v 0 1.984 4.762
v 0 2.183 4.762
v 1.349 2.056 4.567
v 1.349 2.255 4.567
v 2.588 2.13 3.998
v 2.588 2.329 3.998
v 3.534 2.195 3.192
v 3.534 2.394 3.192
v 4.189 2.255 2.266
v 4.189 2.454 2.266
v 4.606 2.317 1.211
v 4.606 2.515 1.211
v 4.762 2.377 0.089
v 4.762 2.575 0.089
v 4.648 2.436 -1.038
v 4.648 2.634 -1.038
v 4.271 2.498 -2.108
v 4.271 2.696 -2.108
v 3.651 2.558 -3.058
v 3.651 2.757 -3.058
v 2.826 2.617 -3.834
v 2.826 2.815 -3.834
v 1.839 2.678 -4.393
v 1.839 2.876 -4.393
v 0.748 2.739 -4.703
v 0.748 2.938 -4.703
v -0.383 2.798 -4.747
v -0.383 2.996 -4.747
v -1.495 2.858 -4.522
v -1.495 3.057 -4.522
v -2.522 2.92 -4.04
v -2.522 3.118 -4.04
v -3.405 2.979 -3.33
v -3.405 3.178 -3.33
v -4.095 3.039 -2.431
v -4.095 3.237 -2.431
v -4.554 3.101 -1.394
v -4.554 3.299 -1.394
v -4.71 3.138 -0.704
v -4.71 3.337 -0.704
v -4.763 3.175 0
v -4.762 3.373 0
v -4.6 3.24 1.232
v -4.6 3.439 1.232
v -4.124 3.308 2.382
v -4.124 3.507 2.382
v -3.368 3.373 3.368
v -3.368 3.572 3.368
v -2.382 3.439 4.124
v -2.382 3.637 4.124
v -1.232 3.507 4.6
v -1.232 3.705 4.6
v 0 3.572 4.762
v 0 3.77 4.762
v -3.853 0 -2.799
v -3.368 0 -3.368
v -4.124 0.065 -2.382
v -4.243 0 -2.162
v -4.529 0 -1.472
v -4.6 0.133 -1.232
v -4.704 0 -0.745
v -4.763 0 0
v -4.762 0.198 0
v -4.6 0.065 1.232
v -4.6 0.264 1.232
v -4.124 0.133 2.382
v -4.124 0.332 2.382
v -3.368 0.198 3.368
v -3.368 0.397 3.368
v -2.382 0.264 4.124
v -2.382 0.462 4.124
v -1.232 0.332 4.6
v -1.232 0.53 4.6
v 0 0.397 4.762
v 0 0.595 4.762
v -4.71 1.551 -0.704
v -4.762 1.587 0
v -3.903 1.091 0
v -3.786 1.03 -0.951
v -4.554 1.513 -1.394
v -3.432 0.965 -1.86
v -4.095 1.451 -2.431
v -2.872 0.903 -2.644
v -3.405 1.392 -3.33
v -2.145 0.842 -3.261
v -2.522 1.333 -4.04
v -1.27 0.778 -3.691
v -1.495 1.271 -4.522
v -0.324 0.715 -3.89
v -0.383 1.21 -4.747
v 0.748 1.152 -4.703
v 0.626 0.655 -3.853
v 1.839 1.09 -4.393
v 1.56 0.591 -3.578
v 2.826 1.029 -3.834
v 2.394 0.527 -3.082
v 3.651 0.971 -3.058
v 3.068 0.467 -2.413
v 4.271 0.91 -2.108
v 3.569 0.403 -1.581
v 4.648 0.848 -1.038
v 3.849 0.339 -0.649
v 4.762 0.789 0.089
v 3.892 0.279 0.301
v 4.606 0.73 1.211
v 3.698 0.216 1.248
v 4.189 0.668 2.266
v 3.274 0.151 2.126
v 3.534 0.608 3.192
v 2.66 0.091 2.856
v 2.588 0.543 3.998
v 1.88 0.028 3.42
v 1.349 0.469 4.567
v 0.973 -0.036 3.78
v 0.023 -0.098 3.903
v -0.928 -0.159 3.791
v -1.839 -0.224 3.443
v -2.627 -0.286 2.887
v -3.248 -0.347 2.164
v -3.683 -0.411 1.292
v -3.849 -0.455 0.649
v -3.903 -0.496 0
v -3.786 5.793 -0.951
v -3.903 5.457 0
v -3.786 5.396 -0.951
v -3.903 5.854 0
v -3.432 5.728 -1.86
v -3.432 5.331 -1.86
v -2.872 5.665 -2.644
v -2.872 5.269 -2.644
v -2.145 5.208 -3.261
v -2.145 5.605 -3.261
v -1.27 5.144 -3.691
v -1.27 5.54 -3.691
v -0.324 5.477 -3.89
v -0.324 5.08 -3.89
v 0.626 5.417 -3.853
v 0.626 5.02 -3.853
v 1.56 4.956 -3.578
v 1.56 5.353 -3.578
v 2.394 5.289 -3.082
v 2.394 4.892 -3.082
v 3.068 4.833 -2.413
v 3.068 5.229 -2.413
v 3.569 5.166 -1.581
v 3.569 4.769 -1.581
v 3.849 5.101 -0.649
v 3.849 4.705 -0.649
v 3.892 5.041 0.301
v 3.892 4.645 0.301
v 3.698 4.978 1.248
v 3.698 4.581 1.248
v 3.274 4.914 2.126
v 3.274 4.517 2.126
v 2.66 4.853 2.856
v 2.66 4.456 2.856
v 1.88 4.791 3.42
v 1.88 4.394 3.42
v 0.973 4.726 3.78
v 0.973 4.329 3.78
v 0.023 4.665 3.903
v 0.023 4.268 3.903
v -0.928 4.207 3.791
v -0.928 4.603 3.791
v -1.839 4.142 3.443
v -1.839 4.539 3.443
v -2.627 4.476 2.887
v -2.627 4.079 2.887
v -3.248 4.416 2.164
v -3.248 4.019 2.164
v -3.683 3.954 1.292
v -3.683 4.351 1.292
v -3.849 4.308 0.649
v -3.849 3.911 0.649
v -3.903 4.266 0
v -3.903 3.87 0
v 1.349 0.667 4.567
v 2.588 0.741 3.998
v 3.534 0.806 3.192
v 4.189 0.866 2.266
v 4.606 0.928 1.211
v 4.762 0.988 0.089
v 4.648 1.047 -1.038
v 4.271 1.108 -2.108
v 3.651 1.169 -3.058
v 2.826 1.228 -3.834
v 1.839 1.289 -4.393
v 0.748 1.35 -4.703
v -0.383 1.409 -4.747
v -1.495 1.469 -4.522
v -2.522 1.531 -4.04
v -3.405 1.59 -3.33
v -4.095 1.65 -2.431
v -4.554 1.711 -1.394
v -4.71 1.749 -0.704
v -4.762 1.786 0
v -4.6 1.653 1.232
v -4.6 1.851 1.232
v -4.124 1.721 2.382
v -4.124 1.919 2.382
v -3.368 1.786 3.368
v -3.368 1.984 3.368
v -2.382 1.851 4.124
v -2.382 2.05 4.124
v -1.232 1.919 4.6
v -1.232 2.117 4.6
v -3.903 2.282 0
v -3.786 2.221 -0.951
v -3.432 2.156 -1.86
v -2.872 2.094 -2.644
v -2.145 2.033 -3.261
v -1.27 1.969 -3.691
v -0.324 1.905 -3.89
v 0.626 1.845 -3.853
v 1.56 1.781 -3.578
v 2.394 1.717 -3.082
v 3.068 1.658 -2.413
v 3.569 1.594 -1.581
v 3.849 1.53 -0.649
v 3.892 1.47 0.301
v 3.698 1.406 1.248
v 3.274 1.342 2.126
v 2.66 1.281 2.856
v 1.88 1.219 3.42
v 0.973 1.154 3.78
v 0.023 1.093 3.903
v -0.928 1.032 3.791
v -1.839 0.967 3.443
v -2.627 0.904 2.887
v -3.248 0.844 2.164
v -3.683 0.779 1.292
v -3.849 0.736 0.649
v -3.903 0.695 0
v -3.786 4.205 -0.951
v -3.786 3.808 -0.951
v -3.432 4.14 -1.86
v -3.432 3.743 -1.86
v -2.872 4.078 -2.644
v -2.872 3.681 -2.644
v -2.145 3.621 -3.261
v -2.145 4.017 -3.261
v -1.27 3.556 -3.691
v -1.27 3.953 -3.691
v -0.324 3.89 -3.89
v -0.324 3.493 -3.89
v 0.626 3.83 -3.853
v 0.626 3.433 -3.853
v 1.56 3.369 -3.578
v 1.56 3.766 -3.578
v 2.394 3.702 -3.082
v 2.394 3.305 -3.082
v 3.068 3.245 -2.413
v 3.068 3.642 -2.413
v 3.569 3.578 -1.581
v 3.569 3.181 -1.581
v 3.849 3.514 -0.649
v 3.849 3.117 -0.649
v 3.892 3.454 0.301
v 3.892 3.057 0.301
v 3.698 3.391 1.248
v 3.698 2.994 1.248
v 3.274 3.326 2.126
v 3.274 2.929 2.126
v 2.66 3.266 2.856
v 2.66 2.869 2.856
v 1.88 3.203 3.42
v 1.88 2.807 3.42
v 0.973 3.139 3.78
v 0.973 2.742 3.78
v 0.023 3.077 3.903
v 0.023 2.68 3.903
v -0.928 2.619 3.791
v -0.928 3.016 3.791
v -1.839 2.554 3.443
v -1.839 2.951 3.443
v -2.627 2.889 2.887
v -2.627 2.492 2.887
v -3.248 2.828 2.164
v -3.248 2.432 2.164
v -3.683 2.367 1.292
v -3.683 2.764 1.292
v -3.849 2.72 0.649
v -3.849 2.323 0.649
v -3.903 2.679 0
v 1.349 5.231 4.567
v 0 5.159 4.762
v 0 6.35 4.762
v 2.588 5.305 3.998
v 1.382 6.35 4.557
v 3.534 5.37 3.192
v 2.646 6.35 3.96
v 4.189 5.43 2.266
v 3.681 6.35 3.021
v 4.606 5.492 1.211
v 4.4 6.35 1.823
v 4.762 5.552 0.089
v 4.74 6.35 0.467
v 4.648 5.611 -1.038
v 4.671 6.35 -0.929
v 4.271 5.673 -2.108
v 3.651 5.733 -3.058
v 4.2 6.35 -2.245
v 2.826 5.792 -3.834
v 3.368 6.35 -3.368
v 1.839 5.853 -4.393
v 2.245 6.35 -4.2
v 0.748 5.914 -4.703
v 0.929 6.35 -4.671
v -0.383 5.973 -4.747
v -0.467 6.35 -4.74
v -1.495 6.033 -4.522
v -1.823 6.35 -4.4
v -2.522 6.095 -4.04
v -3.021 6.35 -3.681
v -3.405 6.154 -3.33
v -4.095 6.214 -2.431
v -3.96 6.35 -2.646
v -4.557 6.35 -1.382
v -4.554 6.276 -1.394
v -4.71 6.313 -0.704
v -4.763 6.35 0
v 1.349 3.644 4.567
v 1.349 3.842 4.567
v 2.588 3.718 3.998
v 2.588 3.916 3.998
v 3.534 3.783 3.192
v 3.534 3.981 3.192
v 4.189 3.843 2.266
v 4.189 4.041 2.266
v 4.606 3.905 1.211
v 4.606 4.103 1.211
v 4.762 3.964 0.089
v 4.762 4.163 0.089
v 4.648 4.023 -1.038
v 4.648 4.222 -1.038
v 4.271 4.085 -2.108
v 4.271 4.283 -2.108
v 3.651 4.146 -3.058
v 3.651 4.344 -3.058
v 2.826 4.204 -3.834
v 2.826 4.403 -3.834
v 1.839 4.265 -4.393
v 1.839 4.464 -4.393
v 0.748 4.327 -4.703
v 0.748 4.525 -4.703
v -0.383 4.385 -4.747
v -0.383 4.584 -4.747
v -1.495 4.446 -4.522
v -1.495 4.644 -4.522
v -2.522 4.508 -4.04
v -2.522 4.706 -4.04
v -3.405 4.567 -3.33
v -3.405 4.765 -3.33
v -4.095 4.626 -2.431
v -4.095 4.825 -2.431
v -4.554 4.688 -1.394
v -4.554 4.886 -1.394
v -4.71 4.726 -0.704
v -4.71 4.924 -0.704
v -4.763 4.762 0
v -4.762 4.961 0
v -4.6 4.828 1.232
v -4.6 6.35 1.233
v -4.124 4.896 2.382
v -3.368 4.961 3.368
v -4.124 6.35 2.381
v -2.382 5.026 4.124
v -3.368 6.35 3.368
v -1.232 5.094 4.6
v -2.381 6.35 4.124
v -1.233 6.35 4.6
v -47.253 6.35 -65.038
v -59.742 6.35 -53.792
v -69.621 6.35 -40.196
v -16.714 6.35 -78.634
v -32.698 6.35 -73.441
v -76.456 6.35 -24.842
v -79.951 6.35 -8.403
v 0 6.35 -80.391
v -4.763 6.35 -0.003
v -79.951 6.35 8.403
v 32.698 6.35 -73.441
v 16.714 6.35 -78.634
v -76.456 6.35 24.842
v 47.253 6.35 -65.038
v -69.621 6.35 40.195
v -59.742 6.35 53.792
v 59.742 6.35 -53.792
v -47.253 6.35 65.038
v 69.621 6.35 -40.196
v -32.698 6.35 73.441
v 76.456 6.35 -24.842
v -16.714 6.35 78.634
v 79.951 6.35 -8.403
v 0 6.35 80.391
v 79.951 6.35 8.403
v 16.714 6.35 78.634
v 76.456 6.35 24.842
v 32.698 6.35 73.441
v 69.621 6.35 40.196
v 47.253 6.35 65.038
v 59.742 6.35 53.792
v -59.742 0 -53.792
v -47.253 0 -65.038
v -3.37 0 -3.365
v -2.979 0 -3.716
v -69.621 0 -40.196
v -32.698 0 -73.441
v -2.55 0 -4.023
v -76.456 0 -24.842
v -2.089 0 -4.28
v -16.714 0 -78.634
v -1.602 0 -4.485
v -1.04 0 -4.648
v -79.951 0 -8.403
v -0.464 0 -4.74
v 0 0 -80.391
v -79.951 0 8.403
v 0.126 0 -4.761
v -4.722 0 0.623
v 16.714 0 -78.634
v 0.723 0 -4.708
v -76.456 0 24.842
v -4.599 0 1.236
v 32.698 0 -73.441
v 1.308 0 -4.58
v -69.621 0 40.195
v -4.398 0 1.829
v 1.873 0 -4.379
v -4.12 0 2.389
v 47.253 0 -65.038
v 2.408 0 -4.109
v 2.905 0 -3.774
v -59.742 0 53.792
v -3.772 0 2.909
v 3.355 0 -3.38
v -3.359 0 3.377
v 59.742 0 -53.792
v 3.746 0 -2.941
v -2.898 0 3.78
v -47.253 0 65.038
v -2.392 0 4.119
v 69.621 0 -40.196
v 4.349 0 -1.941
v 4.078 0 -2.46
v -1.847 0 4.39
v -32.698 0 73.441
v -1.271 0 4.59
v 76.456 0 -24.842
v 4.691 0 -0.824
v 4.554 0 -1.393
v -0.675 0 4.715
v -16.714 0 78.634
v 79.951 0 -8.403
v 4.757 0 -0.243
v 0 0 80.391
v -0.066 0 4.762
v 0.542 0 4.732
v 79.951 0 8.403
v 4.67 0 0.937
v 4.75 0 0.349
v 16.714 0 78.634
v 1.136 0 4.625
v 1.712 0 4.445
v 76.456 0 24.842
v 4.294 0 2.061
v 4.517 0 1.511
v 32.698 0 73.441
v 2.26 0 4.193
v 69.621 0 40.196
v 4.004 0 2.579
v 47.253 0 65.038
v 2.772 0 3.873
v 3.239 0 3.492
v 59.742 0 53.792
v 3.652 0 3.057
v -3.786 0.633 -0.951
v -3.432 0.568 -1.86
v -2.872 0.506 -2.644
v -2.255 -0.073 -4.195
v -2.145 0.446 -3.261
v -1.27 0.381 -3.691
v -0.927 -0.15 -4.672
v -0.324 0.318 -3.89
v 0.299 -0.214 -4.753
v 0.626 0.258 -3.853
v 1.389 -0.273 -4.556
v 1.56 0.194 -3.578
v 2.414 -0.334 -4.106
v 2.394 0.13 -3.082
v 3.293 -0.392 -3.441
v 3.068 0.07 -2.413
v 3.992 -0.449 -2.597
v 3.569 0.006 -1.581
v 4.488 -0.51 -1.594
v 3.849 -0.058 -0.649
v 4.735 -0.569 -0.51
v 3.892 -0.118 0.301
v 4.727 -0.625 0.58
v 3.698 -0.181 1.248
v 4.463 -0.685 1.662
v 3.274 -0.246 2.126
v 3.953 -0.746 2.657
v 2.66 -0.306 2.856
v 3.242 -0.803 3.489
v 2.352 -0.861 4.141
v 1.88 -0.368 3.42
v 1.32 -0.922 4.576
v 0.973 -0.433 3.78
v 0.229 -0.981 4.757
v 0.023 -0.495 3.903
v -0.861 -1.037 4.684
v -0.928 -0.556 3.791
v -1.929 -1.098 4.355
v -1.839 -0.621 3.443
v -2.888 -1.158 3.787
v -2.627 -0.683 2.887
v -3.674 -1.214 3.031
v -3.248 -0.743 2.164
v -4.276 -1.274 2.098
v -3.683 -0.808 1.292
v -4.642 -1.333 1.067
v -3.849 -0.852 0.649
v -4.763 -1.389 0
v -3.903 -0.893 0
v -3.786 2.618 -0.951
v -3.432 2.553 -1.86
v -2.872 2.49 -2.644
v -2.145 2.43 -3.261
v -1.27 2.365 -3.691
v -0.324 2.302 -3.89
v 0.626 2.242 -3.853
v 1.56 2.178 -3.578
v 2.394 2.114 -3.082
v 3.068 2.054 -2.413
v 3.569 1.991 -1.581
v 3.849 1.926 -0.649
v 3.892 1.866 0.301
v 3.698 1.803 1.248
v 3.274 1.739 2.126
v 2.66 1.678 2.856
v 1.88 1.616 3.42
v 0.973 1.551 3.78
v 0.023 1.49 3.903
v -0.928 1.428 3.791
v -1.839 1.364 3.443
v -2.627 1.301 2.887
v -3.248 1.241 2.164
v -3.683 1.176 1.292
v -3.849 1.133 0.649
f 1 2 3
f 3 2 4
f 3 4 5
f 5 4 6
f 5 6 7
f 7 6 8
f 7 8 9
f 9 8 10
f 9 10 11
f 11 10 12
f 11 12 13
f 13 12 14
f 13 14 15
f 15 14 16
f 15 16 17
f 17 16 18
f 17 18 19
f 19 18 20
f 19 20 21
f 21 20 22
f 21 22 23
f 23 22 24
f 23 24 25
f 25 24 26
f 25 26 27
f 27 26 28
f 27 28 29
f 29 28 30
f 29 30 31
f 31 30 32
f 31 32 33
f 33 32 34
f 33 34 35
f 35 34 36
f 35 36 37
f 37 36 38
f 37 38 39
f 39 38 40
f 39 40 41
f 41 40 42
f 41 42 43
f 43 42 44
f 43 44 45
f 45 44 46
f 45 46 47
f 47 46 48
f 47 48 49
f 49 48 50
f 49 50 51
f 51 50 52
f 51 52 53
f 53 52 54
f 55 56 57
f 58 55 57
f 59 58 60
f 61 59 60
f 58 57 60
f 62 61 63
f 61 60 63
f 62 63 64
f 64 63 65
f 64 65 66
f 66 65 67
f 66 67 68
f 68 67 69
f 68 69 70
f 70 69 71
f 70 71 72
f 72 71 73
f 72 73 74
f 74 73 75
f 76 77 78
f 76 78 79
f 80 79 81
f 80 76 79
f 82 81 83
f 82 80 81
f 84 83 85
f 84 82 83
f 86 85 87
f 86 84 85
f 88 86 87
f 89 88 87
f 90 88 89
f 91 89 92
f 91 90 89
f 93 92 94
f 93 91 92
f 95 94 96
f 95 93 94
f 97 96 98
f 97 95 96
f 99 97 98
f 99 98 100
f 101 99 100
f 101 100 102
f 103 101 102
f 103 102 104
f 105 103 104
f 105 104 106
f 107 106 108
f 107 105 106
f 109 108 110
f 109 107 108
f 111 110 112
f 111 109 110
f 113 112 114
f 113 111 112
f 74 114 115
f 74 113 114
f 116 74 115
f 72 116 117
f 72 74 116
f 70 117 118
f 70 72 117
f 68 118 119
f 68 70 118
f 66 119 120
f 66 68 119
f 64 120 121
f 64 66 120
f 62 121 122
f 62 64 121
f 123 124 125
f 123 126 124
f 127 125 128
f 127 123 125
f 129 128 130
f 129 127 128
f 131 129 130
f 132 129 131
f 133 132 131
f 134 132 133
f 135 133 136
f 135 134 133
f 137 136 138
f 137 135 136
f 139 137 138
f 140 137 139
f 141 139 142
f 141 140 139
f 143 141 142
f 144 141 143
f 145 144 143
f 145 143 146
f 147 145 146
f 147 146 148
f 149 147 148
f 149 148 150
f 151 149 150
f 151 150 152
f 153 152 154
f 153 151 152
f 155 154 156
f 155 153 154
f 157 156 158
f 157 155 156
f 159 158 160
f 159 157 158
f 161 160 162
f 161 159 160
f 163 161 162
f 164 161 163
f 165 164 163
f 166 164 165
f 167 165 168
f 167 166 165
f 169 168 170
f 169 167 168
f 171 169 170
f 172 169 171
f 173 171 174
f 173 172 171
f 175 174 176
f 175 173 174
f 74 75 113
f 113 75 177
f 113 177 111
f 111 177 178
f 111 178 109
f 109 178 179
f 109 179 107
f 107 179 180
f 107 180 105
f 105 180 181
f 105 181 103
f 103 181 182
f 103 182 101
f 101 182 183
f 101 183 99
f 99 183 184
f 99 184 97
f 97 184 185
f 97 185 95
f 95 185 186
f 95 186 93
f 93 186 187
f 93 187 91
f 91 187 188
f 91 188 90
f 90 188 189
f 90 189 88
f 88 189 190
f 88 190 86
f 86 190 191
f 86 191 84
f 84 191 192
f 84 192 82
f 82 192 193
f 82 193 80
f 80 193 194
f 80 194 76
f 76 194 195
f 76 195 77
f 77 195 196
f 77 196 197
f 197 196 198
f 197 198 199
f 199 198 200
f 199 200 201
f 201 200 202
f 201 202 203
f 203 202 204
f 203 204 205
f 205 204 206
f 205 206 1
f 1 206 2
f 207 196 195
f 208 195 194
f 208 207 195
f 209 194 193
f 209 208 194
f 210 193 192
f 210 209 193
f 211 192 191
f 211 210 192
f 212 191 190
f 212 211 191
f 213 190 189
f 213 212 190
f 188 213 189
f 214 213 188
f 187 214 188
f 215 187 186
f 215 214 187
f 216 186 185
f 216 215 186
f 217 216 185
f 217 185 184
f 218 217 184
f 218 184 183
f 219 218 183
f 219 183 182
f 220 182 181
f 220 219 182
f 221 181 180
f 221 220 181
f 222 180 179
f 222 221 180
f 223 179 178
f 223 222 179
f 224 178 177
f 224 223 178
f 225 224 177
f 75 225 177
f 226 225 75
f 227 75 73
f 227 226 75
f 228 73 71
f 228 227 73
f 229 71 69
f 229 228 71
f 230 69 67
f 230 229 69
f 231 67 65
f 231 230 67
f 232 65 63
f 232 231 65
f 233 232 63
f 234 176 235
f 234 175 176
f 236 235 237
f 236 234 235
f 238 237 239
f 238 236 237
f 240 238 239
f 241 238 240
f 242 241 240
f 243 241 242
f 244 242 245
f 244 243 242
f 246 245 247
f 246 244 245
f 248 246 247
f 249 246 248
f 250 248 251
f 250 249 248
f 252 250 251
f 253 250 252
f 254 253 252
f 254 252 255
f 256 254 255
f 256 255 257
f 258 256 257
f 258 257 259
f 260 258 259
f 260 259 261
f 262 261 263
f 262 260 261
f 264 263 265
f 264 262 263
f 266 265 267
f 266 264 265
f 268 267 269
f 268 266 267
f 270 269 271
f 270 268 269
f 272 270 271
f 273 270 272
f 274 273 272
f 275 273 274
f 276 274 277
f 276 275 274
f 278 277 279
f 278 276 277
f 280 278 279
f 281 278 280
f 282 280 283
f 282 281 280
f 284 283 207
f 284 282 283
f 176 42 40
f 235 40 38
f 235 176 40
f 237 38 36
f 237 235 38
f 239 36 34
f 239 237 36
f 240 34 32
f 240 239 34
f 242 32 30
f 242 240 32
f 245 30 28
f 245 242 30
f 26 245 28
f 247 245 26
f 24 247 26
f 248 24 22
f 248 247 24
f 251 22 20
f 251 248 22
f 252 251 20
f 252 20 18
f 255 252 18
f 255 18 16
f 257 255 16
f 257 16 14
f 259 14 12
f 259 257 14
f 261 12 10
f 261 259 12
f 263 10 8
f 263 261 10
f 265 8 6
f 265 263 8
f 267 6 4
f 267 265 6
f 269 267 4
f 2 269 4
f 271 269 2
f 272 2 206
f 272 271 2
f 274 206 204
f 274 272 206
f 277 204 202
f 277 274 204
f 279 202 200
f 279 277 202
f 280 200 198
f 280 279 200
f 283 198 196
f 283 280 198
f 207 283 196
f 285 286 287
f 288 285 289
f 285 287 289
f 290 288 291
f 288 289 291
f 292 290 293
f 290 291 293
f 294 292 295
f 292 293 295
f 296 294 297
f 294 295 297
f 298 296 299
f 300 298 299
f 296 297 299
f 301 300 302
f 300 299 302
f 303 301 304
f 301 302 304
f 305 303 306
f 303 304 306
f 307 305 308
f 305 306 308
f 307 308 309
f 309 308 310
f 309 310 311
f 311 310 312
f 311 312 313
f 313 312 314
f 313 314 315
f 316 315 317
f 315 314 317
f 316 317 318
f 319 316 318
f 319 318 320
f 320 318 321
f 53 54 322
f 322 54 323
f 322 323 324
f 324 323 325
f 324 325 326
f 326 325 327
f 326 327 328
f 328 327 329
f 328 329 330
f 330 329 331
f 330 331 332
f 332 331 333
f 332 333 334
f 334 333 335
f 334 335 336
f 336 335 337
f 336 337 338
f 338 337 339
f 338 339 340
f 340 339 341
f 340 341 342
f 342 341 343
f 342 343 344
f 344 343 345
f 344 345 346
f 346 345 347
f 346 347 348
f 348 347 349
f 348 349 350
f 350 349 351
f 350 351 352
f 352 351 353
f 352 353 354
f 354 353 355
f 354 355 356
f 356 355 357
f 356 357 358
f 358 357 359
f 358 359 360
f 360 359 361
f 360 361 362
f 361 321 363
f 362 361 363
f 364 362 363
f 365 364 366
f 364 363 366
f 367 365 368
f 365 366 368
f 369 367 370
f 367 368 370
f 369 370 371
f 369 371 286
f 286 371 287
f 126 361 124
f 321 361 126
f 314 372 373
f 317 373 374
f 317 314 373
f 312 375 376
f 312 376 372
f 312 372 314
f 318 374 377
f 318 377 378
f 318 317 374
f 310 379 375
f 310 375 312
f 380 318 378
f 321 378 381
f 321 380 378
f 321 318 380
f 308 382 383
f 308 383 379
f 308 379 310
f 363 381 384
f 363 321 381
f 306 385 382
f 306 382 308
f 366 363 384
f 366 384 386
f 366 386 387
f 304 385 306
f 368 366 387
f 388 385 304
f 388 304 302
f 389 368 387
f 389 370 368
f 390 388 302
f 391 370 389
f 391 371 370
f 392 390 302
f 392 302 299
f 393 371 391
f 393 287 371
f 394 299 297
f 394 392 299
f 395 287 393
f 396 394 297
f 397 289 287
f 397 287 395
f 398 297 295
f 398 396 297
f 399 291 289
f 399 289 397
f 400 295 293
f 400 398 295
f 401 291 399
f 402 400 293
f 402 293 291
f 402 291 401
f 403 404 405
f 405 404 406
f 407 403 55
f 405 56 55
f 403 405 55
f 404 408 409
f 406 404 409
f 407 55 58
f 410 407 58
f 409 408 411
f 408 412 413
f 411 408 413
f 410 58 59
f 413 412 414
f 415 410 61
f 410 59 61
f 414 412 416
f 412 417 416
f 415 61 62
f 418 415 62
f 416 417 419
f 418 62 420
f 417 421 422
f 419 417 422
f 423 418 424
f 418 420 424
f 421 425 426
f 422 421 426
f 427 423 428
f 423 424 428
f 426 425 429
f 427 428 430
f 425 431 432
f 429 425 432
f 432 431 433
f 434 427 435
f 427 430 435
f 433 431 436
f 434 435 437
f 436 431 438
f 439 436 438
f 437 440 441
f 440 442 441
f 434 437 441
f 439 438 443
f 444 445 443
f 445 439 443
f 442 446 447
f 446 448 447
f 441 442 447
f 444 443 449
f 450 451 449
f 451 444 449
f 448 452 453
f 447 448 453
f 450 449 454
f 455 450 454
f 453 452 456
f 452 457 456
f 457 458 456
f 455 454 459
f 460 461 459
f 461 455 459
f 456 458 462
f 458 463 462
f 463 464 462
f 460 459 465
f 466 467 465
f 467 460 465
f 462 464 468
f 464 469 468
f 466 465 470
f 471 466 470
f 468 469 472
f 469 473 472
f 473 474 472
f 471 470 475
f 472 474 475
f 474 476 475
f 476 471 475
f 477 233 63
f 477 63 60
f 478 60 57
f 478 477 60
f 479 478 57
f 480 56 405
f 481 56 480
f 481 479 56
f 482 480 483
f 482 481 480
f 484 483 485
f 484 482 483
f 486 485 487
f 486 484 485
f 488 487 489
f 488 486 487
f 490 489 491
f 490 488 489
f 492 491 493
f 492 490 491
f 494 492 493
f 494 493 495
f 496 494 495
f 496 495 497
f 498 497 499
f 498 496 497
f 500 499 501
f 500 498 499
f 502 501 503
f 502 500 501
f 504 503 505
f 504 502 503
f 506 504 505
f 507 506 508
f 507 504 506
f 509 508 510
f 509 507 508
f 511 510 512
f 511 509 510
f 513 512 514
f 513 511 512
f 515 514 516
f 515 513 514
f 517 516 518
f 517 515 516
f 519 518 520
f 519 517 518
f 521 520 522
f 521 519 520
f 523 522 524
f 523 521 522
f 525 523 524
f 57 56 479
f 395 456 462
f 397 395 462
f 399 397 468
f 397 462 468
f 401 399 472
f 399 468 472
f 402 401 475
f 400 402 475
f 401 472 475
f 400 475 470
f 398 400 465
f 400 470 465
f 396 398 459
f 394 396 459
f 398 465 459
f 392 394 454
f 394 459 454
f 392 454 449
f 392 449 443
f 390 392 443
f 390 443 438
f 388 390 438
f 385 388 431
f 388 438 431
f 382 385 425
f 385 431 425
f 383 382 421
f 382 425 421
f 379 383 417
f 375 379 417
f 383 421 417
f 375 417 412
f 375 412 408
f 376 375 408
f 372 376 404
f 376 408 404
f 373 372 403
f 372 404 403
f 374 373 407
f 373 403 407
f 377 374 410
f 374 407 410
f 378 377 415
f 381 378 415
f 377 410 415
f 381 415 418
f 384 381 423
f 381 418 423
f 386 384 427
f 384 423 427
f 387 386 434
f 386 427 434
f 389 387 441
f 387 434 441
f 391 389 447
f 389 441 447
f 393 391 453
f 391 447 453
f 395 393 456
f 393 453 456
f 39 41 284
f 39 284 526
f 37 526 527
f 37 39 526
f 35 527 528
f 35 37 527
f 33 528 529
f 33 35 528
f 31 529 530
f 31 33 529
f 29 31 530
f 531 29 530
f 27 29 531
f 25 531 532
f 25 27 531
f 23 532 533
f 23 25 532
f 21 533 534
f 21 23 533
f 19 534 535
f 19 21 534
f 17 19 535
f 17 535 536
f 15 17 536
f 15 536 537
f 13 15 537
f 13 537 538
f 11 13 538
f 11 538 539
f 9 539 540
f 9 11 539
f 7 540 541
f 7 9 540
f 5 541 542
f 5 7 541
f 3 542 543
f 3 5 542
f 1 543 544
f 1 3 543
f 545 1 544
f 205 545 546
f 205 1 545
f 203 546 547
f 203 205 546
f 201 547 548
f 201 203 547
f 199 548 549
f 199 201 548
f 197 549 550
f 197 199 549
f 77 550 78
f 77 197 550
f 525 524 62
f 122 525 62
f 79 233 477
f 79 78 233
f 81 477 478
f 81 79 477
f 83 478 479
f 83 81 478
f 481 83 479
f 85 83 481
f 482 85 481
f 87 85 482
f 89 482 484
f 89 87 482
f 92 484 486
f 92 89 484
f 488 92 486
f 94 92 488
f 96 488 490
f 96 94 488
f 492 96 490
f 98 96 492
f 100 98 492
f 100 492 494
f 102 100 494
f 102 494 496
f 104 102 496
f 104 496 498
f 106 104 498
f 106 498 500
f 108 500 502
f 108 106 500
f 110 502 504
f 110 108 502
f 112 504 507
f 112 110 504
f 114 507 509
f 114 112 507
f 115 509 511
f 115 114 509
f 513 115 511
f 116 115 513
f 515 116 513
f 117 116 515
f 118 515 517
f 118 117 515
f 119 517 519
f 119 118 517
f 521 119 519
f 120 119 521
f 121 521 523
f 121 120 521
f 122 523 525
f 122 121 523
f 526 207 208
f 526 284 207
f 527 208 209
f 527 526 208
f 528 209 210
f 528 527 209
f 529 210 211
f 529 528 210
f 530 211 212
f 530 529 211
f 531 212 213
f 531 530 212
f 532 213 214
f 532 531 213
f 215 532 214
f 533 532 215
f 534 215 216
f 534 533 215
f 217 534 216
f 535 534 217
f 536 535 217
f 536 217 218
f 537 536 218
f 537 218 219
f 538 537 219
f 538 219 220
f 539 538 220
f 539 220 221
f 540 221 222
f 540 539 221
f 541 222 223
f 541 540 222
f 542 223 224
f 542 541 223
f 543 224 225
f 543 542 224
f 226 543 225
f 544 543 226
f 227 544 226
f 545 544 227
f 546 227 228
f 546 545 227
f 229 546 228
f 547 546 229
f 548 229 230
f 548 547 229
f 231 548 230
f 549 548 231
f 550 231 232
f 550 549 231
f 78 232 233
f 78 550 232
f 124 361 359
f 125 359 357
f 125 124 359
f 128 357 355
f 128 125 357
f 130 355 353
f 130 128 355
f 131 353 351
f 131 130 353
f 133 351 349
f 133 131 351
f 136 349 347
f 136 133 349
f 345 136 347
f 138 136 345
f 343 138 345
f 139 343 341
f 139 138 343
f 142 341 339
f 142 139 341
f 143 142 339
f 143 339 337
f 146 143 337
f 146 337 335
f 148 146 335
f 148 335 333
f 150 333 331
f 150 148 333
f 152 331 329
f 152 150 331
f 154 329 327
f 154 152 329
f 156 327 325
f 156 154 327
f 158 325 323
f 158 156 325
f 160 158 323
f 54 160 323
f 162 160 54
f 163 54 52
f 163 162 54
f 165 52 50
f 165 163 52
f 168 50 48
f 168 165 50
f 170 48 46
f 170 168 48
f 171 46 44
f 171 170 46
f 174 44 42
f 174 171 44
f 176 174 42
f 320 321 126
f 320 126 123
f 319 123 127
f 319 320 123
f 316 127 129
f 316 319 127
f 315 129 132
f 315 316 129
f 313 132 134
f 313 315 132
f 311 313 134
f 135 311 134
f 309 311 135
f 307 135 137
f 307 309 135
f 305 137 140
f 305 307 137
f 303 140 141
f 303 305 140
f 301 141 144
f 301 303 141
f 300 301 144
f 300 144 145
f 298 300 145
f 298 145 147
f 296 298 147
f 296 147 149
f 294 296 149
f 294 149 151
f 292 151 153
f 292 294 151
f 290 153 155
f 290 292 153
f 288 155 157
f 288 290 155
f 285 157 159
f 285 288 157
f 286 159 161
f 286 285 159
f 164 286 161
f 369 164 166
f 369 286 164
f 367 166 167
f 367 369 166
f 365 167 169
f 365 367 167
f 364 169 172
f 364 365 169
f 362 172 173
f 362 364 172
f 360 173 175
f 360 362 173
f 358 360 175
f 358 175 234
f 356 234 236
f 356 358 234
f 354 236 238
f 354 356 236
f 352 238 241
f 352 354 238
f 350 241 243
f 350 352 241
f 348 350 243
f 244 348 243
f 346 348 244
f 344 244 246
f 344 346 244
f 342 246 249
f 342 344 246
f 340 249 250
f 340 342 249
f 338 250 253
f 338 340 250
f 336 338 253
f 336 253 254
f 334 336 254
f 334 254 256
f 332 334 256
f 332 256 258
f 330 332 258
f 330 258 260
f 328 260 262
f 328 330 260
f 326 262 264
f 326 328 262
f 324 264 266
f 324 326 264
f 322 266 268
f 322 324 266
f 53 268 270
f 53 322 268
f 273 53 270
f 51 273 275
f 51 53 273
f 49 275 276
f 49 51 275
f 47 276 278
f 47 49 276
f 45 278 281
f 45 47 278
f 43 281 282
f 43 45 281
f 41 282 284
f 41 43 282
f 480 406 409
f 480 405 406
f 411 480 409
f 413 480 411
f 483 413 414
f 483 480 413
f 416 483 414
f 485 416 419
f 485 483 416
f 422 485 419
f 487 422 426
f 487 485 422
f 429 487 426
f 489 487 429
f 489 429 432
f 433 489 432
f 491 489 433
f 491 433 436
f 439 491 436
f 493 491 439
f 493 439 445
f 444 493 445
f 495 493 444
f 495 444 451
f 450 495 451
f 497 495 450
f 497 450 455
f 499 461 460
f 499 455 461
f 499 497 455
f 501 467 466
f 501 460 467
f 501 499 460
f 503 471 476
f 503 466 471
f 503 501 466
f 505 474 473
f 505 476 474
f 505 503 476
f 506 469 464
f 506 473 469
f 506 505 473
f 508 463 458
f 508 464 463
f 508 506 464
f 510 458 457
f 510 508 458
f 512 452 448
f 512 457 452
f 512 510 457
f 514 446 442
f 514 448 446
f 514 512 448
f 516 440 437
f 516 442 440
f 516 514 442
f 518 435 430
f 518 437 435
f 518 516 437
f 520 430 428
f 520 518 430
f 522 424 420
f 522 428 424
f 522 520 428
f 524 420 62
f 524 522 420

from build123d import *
from build123d.topology import SkipClean

# Parameters (mm, degrees)
SKETCH1_R           = 80.391
BOSS_EXTRUDE1_DEPTH = 6.35
SKETCH3_R           = 4.7625
CUT_EXTRUDE2_DEPTH  = 114.867239635
THREAD1_PITCH       = 1.5875


with BuildPart() as part:
    # Sketch1 → Boss-Extrude1 (new body)
    with BuildSketch(Plane(origin=(0, 0, 0), x_dir=(1, 0, 0), z_dir=(0, 1, 0))):
        with Locations(Location((0, 0, 0), (0, 0, 270))):
            Circle(SKETCH1_R)
    extrude(amount=BOSS_EXTRUDE1_DEPTH)

    # Sketch3 → Cut-Extrude2 (cut, through all)
    with BuildSketch(Plane(origin=(0, 6.35, 0), x_dir=(1, 0, 0), z_dir=(0, 1, 0))):
        with Locations(Location((0, 0, 0), (0, 0, 270))):
            Circle(SKETCH3_R)
    extrude(amount=-CUT_EXTRUDE2_DEPTH, mode=Mode.SUBTRACT)

    # Thread1: the profile of Thread Profile1 profile screwed along a right-hand helix of 4 turns, 8 arcs to a turn; built about Z, then put on its axis
    with SkipClean():  # the faces are left unmerged after this step: merging them gives an invalid solid
        thread1_z = Axis((0, 0, 0), (0, 0, 1))
        thread1_corners = [(4.7628, 0, -0.000173205), (4.7628, 0, 1.389235701), (3.903240423, 0, 0.892968748), (3.903240423, 0, 0.496093748)]
        with BuildLine(mode=Mode.PRIVATE) as thread1_profile:
            Line(thread1_corners[0], thread1_corners[1])
            Line(thread1_corners[1], thread1_corners[2])
            Line(thread1_corners[2], thread1_corners[3])
            Line(thread1_corners[3], thread1_corners[0])
        thread1_cap = Face(thread1_profile.wire())
        thread1_turn_angles = [0, 22.5, 45, 67.5, 90, 112.5, 135, 157.5, 180, 202.5, 225, 247.5, 270, 292.5, 315, 337.5, 360]
        thread1_turn_weights = [1, 0.9238795325112867, 1, 0.9238795325112867, 1, 0.9238795325112867, 1, 0.9238795325112867, 1, 0.9238795325112867, 1, 0.9238795325112867, 1, 0.9238795325112867, 1, 0.9238795325112867, 1]
        thread1_turn_rails = [Edge.make_bspline([Vector(p[0], p[1], 0).rotate(thread1_z, thread1_turn_angles[k]) / thread1_turn_weights[k] + Vector(0, 0, p[2] + THREAD1_PITCH * thread1_turn_angles[k] / 360) for k in range(17)], [0, 0, 0, 1, 1, 2, 2, 3, 3, 4, 4, 5, 5, 6, 6, 7, 7, 8, 8, 8], 2, thread1_turn_weights) for p in thread1_corners]
        thread1_turn_sides = [Face.make_surface_from_curves(thread1_turn_rails[p[0]], thread1_turn_rails[p[1]]) for p in [(0, 1), (1, 2), (2, 3), (3, 0)]]
        thread1 = Plane(origin=(0, 6.35, 0), x_dir=(-1, 0, 0), z_dir=(0, -1, 0)) * Solid(Shell([*[p.moved(Location((0, 0, THREAD1_PITCH * i))) for i in range(4) for p in thread1_turn_sides], thread1_cap, thread1_cap.rotate(thread1_z, 1440).moved(Location((0, 0, THREAD1_PITCH * 1440 / 360)))]))
        add(thread1)


solid = part.part
